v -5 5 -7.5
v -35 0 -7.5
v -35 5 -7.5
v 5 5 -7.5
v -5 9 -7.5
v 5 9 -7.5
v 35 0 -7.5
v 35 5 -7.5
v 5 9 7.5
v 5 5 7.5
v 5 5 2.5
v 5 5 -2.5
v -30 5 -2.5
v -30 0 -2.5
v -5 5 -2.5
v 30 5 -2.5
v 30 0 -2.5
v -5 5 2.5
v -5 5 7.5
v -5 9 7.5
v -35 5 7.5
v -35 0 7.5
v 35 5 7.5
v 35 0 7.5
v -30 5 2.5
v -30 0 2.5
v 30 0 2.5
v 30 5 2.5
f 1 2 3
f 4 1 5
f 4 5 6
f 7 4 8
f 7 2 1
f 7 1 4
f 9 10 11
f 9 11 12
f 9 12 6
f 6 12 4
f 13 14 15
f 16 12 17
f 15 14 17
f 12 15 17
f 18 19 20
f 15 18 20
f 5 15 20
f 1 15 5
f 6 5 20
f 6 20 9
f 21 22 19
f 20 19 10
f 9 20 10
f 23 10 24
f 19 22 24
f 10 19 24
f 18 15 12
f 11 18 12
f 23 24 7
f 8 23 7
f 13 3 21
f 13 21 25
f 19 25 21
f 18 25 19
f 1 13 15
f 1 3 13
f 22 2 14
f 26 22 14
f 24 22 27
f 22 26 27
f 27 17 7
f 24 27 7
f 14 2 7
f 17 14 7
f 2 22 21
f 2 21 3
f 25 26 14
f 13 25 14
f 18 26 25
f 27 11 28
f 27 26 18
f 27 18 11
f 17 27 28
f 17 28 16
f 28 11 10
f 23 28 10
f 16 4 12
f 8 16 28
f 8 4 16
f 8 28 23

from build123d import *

# Parameters (mm, degrees)
SKETCH2_W           = 70
SKETCH2_H           = 15
SKETCH2_W_2         = 60
SKETCH2_H_2         = 5
BOSS_EXTRUDE3_DEPTH = 5
SKETCH3_W           = 10
SKETCH3_H           = 15
BOSS_EXTRUDE4_DEPTH = 4


with BuildPart() as part:
    # Sketch2 → Boss-Extrude3 (new body)
    with BuildSketch(Plane(origin=(0, 0, 0), x_dir=(1, 0, 0), z_dir=(0, 1, 0))):
        Rectangle(SKETCH2_W, SKETCH2_H)
        Rectangle(SKETCH2_W_2, SKETCH2_H_2, mode=Mode.SUBTRACT)
    extrude(amount=BOSS_EXTRUDE3_DEPTH)

    # Sketch3 → Boss-Extrude4 (add)
    with BuildSketch(Plane(origin=(0, 5, 0), x_dir=(1, 0, 0), z_dir=(0, 1, 0))):
        Rectangle(SKETCH3_W, SKETCH3_H)
    extrude(amount=BOSS_EXTRUDE4_DEPTH)


solid = part.part
